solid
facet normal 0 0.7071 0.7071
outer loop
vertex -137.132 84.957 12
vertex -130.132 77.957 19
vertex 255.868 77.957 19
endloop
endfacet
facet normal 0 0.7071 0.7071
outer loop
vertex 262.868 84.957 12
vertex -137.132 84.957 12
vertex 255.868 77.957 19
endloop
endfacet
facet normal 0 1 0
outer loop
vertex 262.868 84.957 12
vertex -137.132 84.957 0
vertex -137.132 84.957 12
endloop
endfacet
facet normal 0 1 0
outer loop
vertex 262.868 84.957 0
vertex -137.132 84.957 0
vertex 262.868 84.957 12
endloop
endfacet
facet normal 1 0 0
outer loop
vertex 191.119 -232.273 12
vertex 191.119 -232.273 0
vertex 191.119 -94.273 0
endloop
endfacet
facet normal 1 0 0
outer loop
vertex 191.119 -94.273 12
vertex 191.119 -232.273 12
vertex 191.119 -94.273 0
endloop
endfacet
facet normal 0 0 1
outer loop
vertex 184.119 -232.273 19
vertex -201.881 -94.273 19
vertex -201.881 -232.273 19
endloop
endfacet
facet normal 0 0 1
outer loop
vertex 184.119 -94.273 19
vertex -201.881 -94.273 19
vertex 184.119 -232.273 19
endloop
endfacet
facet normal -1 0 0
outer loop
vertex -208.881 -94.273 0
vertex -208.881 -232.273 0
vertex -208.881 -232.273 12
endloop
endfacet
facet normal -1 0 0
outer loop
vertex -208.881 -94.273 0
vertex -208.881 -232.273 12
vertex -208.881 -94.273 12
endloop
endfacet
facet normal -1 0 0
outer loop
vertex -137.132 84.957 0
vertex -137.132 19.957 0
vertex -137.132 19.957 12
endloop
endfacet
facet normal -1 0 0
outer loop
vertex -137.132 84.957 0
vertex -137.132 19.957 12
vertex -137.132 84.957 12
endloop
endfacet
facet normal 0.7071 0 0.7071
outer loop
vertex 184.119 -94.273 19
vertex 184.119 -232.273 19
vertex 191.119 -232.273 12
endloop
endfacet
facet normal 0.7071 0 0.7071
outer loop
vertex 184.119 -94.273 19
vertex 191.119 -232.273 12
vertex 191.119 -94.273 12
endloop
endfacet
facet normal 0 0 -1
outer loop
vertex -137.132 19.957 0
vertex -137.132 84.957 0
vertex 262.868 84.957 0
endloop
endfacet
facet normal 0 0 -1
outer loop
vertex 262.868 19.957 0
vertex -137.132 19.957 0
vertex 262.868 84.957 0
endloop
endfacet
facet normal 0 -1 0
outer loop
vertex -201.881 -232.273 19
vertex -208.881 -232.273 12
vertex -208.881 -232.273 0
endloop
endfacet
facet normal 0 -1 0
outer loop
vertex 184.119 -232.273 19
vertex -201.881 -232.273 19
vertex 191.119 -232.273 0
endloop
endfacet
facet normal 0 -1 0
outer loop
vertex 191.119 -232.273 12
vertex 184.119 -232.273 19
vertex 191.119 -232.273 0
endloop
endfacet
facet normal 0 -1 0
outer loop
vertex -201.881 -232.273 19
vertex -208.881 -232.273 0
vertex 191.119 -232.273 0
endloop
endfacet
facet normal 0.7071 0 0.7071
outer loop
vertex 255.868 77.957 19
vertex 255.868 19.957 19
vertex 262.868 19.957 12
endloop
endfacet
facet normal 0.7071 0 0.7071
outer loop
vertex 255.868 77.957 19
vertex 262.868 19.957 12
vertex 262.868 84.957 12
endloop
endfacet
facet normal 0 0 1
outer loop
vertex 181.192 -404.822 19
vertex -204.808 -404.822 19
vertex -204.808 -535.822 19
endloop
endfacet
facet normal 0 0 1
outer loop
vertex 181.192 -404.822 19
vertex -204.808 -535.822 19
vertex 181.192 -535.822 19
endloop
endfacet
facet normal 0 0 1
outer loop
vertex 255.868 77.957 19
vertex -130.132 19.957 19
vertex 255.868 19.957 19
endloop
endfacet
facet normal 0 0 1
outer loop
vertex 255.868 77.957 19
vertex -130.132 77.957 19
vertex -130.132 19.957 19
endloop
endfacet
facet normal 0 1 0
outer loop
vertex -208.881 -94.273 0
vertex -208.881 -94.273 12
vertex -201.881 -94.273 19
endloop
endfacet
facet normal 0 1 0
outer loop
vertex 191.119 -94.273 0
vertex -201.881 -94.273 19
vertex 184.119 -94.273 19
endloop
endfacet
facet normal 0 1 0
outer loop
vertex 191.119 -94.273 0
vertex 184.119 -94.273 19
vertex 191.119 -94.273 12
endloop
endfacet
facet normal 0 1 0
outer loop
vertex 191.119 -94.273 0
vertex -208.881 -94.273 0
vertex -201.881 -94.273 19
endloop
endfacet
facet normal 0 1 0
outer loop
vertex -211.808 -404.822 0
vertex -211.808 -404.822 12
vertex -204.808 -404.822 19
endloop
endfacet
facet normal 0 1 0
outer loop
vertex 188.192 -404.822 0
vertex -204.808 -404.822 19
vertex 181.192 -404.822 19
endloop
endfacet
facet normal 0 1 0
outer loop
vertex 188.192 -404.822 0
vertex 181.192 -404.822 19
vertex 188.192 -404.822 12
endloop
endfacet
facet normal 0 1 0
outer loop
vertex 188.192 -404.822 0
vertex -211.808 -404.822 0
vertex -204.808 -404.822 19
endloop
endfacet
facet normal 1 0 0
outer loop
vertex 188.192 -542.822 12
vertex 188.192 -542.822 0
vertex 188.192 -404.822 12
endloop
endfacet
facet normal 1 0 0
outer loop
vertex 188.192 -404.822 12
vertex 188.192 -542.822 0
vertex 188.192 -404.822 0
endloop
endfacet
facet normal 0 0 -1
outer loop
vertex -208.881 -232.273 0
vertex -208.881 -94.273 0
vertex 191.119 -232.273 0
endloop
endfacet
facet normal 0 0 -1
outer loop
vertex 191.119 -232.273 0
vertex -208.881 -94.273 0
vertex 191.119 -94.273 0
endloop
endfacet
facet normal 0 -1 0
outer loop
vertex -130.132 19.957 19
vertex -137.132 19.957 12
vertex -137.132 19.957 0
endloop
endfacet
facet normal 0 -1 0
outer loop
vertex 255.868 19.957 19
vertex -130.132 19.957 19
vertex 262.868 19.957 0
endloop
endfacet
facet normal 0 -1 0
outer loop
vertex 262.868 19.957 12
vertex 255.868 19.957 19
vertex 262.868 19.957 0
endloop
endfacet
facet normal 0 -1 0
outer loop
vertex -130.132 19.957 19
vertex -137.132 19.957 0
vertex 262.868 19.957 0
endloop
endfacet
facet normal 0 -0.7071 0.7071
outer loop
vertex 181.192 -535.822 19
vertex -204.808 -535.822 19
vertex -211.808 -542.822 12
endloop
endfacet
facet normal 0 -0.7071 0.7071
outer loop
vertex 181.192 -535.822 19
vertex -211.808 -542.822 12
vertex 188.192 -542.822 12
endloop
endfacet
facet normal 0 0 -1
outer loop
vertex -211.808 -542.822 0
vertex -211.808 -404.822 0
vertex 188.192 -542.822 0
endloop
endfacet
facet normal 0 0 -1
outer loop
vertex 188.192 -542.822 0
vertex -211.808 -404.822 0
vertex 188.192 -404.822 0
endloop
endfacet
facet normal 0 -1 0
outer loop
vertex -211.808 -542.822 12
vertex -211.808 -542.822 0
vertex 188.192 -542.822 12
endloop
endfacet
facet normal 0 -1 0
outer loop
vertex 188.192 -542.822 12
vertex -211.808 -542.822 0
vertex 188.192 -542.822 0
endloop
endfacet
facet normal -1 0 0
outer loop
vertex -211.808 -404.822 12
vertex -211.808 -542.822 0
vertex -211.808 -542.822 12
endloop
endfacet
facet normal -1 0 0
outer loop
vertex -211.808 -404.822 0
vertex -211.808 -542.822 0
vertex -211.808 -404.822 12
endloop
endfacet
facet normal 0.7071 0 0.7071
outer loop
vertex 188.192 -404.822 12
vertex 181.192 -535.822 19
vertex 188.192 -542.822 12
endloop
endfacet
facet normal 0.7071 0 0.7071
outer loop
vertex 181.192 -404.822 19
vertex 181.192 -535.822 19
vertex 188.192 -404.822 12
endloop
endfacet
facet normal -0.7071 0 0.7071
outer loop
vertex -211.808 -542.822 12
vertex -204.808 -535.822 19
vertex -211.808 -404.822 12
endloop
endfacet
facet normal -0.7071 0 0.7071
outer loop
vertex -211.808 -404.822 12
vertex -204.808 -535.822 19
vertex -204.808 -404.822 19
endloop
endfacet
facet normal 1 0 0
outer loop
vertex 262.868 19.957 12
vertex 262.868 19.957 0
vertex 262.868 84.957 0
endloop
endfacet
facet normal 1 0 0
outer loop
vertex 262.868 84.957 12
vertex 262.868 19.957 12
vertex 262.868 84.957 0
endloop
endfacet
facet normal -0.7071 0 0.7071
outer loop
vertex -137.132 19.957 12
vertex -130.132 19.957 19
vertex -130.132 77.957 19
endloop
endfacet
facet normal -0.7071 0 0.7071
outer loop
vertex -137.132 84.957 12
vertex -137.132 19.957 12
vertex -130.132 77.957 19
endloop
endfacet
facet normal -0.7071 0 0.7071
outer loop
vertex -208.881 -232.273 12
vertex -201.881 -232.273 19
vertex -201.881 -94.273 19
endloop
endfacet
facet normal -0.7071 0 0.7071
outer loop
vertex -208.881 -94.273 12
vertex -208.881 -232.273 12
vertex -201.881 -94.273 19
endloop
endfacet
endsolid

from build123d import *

# Parameters (mm, degrees)
F0_W     = 400
F0_H     = 138
F1_DEPTH = 19
F2_W     = 400
F2_H     = 65
F3_DEPTH = 19
F4_W     = 400
F4_H     = 138
F5_DEPTH = 19
F6_SIZE  = 7
F7_SIZE  = 7
F8_SIZE  = 7


with BuildPart() as f1:
    # F0 (on Top) → F1 (new body)
    with BuildSketch(Plane.XY):
        with Locations((-8.880615, -163.273152)):
            Rectangle(F0_W, F0_H)
    extrude(amount=F1_DEPTH)

    # F7
    f7_edges = [f1.edges().sort_by_distance(p)[0] for p in [
        (-208.880615, -163.273152, 19),
        (191.119385, -163.273152, 19),
    ]]
    chamfer(f7_edges, length=F7_SIZE)


with BuildPart() as f3:
    # F2 (on Top) → F3 (new body)
    with BuildSketch(Plane.XY):
        with Locations((62.868291, 52.457108)):
            Rectangle(F2_W, F2_H)
    extrude(amount=F3_DEPTH)

    # F8
    f8_edges = [f3.edges().sort_by_distance(p)[0] for p in [
        (-137.131709, 52.457108, 19),
        (62.868291, 84.957108, 19),
        (262.868291, 52.457108, 19),
    ]]
    chamfer(f8_edges, length=F8_SIZE)


with BuildPart() as f5:
    # F4 (on Top) → F5 (new body)
    with BuildSketch(Plane.XY):
        with Locations((-11.807979, -473.822236)):
            Rectangle(F4_W, F4_H)
    extrude(amount=F5_DEPTH)

    # F6
    f6_edges = [f5.edges().sort_by_distance(p)[0] for p in [
        (-11.807979, -542.822236, 19),
        (-211.807979, -473.822236, 19),
        (188.192021, -473.822236, 19),
    ]]
    chamfer(f6_edges, length=F6_SIZE)


solid = Compound([f1.part, f3.part, f5.part])
